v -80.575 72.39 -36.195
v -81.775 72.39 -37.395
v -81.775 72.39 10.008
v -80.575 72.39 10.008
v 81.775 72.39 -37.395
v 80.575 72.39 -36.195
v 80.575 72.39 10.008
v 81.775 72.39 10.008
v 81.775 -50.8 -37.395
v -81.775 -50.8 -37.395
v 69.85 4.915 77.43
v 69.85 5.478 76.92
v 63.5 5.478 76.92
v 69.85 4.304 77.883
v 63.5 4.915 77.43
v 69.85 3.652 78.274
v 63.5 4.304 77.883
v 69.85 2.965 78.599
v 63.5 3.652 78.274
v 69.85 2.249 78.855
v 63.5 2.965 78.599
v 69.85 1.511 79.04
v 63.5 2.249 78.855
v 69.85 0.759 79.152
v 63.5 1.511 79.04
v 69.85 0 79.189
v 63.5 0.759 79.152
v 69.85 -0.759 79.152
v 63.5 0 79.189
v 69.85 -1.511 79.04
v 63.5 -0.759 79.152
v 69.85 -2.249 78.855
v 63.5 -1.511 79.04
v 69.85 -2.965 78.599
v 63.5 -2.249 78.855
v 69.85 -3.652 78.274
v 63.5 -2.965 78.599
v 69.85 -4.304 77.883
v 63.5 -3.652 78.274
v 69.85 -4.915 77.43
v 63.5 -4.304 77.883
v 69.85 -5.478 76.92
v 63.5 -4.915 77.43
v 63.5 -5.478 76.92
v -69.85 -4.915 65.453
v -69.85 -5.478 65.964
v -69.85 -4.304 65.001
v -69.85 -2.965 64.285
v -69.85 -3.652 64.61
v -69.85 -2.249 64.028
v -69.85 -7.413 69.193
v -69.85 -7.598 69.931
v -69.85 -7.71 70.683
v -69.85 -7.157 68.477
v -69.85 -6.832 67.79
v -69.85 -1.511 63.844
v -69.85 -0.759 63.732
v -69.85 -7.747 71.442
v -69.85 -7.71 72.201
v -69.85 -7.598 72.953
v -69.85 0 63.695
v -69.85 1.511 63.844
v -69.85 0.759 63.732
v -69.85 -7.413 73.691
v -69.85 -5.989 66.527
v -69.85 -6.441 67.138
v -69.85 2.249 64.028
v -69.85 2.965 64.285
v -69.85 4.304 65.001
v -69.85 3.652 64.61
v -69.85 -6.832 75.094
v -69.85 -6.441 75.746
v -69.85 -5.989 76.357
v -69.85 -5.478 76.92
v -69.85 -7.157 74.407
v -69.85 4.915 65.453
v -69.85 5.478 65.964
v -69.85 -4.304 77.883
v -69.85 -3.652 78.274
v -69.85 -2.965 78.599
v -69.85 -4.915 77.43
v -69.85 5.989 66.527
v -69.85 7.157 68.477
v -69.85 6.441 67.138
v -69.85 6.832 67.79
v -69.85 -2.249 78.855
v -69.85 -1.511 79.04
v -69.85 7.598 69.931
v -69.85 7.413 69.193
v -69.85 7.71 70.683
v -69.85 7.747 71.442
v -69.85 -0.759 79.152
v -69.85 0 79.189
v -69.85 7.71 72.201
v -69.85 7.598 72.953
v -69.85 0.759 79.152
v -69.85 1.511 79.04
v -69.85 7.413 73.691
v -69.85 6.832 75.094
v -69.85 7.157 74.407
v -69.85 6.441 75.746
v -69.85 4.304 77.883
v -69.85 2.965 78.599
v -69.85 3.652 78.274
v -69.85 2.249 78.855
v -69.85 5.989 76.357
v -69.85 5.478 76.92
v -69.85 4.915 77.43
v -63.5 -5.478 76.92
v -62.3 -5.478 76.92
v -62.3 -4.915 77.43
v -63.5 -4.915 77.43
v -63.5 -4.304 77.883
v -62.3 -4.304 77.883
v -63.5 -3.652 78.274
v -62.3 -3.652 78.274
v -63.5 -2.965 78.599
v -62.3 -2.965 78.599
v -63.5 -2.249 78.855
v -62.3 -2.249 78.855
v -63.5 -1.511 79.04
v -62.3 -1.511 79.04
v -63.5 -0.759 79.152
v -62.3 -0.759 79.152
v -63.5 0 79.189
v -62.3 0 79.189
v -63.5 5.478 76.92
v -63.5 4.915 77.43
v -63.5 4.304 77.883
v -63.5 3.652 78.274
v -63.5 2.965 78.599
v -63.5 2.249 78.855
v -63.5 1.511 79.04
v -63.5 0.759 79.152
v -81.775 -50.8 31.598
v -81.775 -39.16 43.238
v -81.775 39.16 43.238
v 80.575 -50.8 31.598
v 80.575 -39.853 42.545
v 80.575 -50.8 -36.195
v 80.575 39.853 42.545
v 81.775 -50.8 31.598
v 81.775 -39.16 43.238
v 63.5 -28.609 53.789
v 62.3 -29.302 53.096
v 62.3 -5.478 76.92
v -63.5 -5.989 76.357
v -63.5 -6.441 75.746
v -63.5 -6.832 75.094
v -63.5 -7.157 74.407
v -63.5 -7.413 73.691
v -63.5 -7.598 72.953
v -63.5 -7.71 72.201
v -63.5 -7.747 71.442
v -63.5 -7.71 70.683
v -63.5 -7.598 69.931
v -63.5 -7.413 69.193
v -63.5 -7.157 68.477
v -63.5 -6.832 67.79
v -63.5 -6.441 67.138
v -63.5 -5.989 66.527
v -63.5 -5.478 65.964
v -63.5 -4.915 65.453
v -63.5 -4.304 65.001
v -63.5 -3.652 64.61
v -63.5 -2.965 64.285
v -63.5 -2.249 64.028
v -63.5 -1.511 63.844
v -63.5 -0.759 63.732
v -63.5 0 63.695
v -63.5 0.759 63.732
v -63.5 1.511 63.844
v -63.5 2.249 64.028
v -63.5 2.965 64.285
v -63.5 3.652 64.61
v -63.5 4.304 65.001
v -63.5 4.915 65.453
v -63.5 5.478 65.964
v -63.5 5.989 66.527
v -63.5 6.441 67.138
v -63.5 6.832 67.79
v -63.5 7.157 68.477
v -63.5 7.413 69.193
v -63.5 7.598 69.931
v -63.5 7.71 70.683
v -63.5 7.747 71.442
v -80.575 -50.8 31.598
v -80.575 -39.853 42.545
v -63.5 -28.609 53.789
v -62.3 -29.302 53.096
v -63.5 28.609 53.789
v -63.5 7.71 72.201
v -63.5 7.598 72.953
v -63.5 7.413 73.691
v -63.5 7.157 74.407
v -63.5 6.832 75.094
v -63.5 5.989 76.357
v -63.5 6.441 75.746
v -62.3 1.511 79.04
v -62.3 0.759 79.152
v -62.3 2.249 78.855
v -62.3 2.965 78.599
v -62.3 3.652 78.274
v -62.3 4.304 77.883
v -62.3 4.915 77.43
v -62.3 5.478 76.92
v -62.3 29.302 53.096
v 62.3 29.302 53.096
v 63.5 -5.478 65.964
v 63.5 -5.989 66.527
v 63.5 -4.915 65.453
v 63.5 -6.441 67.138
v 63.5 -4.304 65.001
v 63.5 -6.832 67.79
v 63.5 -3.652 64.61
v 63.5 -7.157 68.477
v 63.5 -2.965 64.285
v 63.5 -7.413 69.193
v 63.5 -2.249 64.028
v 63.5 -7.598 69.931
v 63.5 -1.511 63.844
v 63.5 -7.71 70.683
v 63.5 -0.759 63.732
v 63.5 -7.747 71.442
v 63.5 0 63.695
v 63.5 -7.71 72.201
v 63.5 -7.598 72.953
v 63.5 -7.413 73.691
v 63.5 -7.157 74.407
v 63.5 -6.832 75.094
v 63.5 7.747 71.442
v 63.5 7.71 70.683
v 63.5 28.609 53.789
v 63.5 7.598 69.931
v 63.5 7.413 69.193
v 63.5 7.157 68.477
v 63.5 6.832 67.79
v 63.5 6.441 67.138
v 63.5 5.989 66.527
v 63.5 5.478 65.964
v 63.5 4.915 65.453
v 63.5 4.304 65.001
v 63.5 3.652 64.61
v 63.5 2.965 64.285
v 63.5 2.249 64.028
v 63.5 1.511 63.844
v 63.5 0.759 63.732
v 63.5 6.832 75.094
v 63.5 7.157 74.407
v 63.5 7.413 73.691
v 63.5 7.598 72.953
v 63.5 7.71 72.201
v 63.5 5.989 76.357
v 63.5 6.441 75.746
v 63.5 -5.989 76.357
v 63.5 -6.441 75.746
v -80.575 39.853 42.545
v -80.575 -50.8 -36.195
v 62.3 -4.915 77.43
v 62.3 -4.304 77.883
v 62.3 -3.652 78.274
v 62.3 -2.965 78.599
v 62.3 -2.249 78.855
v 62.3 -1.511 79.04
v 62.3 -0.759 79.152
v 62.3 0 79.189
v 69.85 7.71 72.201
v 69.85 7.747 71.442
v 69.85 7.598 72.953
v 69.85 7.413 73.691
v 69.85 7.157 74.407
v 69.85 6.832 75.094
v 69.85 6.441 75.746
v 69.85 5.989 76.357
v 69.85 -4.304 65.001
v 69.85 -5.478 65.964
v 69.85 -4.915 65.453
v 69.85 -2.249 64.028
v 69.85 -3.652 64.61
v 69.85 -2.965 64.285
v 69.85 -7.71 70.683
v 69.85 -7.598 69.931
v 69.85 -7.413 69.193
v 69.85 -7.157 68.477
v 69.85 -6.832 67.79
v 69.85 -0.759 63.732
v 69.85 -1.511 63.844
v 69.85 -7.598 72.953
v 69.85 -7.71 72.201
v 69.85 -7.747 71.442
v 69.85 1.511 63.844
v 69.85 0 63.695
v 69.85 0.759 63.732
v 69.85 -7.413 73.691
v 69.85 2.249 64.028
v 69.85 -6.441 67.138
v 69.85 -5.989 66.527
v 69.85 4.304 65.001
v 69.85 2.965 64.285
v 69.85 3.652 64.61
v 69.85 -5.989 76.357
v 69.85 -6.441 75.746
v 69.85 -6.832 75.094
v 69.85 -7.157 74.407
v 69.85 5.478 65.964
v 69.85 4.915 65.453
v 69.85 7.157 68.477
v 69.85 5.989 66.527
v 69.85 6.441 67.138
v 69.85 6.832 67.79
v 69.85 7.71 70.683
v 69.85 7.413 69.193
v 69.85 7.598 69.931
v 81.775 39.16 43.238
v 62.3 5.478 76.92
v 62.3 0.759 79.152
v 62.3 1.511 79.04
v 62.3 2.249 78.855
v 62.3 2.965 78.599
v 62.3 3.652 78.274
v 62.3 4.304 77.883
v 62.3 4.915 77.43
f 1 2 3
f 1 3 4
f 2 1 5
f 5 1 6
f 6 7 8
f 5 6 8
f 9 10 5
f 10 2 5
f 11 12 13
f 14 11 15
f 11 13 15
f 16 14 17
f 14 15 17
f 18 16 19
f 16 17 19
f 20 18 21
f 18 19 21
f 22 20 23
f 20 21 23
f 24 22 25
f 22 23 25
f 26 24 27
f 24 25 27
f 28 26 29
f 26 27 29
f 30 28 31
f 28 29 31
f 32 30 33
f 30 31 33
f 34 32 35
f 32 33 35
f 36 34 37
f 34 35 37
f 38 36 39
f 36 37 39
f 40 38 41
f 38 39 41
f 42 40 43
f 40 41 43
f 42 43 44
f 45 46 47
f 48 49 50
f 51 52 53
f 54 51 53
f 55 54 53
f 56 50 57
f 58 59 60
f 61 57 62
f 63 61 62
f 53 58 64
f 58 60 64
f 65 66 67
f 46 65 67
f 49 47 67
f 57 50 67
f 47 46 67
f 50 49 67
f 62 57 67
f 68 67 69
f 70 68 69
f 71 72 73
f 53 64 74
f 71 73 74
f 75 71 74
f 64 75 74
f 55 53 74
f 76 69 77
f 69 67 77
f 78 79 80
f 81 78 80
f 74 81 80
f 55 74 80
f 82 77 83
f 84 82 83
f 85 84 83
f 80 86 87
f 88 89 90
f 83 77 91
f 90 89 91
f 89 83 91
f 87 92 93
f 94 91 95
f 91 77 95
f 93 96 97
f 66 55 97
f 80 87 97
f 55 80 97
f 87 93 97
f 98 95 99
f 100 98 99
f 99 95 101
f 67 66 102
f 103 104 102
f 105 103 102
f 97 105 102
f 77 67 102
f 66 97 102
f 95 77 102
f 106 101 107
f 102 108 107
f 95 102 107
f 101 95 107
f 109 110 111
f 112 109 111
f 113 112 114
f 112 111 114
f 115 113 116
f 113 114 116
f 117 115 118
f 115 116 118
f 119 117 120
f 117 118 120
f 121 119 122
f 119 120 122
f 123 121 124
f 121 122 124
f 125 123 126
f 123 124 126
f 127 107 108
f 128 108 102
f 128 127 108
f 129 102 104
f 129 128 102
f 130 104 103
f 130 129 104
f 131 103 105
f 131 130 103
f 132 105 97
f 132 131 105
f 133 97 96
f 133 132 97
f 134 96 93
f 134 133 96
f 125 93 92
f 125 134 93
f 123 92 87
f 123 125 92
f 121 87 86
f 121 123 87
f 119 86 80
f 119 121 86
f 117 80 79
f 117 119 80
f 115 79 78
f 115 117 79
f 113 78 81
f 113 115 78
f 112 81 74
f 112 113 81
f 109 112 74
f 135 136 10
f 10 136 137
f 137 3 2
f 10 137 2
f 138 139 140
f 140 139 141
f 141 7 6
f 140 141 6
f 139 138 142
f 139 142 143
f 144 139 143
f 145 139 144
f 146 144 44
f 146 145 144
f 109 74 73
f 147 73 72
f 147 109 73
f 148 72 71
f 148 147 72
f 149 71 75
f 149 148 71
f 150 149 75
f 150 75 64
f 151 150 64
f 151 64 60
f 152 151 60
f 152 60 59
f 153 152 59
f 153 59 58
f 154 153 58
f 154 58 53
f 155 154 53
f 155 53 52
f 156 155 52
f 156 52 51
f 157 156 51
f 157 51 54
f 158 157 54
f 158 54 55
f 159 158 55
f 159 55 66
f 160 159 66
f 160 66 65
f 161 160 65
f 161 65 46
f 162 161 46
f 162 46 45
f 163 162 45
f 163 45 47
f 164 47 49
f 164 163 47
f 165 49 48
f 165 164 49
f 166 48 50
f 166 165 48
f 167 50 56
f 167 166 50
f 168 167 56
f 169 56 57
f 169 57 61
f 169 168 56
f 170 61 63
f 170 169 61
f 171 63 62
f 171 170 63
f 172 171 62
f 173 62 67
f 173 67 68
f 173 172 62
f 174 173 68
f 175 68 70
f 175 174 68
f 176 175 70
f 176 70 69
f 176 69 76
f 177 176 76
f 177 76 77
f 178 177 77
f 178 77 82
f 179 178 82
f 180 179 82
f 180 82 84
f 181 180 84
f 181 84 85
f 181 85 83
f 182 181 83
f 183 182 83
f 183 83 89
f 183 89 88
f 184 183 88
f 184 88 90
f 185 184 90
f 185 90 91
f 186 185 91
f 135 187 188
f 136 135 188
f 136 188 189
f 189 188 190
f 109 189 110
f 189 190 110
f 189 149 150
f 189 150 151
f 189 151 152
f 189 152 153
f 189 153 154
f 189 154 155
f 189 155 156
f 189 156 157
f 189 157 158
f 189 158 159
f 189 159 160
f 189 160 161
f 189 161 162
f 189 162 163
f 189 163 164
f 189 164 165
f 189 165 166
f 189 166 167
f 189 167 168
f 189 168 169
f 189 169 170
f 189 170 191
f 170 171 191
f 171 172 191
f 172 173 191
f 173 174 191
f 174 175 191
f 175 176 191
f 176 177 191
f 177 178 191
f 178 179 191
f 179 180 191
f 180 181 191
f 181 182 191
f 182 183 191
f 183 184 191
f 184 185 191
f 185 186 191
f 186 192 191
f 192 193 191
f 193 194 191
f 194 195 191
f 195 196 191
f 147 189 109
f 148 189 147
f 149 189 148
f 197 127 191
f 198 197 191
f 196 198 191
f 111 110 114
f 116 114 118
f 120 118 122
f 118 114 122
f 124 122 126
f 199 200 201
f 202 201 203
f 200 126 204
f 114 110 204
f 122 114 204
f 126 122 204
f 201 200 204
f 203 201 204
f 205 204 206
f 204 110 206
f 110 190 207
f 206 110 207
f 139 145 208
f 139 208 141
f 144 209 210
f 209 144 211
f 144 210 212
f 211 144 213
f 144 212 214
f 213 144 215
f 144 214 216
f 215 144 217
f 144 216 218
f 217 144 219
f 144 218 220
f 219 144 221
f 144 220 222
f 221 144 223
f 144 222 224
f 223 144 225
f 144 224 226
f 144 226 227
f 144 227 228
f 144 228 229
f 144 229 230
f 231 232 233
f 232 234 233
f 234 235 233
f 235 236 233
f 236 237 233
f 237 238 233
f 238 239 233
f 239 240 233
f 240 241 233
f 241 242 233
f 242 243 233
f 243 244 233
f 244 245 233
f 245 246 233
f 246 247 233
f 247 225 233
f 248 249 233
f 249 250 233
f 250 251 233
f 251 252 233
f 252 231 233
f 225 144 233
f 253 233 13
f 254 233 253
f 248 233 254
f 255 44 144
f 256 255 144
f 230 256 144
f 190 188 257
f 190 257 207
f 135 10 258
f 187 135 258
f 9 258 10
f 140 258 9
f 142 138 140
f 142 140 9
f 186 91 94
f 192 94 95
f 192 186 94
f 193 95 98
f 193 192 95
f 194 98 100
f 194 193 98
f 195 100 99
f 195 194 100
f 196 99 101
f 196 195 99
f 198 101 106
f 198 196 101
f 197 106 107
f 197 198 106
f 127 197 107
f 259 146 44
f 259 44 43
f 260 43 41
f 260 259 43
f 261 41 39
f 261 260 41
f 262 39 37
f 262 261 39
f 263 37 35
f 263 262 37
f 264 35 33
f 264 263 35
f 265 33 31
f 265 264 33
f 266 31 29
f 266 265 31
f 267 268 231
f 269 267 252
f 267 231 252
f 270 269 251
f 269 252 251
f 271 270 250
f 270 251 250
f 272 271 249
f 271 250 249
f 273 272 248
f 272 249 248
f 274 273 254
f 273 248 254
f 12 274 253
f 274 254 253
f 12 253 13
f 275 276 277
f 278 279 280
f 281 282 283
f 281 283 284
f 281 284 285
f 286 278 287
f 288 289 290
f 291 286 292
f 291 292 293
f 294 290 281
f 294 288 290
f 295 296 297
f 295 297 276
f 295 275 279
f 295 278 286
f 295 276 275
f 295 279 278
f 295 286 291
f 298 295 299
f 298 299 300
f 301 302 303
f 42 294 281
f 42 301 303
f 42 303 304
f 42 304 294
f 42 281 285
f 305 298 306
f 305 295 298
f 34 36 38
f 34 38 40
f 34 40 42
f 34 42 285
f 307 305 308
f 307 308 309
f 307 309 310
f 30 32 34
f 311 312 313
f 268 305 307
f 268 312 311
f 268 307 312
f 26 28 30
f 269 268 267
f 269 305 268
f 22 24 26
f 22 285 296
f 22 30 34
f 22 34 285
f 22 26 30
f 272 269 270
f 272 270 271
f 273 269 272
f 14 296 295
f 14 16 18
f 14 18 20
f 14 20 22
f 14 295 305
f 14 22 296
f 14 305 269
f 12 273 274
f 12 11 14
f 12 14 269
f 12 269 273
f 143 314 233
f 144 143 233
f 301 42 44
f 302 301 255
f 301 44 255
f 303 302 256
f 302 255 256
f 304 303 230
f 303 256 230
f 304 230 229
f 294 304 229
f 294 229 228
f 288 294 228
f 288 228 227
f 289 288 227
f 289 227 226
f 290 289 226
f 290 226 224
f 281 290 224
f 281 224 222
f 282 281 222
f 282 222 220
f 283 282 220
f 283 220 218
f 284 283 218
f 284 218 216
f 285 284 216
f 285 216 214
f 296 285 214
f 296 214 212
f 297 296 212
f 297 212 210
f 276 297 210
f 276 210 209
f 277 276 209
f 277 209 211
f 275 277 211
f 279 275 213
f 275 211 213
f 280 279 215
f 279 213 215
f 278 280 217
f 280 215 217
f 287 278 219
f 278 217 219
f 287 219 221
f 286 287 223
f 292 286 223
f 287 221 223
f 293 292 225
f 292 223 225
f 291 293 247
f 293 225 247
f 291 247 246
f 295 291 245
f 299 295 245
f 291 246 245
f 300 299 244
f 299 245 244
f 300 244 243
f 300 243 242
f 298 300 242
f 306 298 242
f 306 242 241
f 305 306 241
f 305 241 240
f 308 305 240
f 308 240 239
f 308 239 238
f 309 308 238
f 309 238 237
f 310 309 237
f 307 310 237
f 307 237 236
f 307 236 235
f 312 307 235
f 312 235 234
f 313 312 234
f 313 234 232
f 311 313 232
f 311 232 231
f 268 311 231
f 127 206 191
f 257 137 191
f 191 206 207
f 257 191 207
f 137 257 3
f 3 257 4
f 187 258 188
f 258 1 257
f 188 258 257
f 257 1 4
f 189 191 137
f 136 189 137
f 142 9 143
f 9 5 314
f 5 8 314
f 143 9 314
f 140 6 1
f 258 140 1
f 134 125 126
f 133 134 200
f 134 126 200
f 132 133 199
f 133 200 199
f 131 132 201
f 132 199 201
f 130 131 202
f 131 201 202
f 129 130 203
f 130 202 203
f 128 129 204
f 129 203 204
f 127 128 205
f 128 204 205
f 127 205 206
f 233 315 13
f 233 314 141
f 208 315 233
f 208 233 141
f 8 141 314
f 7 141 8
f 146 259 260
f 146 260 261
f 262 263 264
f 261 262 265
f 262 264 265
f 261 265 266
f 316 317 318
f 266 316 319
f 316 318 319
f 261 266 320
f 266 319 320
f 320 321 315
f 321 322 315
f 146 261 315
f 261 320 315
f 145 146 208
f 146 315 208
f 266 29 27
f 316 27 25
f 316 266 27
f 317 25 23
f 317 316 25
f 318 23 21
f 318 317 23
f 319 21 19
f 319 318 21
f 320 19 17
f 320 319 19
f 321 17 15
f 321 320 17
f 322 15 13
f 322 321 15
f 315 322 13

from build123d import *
from build123d import SkipClean  # not in build123d's __all__

# Parameters (mm, degrees)
F1_DEPTH      = 72.39
F1_DEPTH_BACK = 50.8
F2_R          = 7.747
F3_DEPTH      = 69.85
F3_DEPTH_BACK = 69.85
F4_W          = 124.6
F4_H          = 26.092820323
F5_DEPTH      = 72.391
F5_DEPTH_BACK = 50.801
F7_DEPTH      = 81.776
F7_DEPTH_BACK = 81.776


with BuildPart() as f1:
    # F0 (on Front) → F1 (new body, two sides)
    with BuildSketch(Plane.XZ) as f1_sk:
        Polygon((80.575, -36.195), (0, -36.195), (-80.575, -36.195), (-80.575, 42.545), (-62.3, 53.0960761694), (-62.3, 79.1888964925), (-63.5, 79.1888964925), (-63.5, 53.7888964925), (-81.775, 43.237820323), (-81.775, -37.395), (0, -37.395), (81.775, -37.395), (81.775, 43.237820323), (63.5, 53.7888964925), (63.5, 79.1888964925), (62.3, 79.1888964925), (62.3, 53.0960761694), (80.575, 42.545), align=None)
    extrude(amount=-F1_DEPTH)
    extrude(f1_sk.sketch, amount=F1_DEPTH_BACK)

    # F2 (on Right) → F3 (join, two sides)
    with BuildSketch(Plane.YZ) as f3_sk:
        with Locations((0, 71.4418964925)):
            Circle(F2_R)
    extrude(amount=-F3_DEPTH)
    extrude(f3_sk.sketch, amount=F3_DEPTH_BACK)

    # F4 (on Front) → F5 (cut, two sides)
    with BuildSketch(Plane.XZ) as f5_sk:
        with Locations((0, 66.142486331)):
            Rectangle(F4_W, F4_H)
    extrude(amount=-F5_DEPTH, mode=Mode.SUBTRACT)
    extrude(f5_sk.sketch, amount=F5_DEPTH_BACK, mode=Mode.SUBTRACT)

    # F6 (on Right) → F7 (cut, two sides)
    with BuildSketch(Plane.YZ) as f7_sk:
        with BuildLine():
            Line((-50.8, 81.7288964925), (-50.8, 31.5978089602))
            Line((-50.8, 31.5978089602), (-5.4779562339, 76.9198527263))
            ThreePointArc((-5.4779562339, 76.9198527263), (0, 79.1888964925), (5.4779562339, 76.9198527263))
            Line((5.4779562339, 76.9198527263), (72.39, 10.0078089602))
            Line((72.39, 10.0078089602), (72.39, 81.7288964925))
            Line((72.39, 81.7288964925), (-50.8, 81.7288964925))
        make_face()
    with SkipClean():  # cleaning this boolean's faces spoils the solid; the shape is the same uncleaned
        extrude(amount=-F7_DEPTH, mode=Mode.SUBTRACT)
        extrude(f7_sk.sketch, amount=F7_DEPTH_BACK, mode=Mode.SUBTRACT)


solid = f1.part
